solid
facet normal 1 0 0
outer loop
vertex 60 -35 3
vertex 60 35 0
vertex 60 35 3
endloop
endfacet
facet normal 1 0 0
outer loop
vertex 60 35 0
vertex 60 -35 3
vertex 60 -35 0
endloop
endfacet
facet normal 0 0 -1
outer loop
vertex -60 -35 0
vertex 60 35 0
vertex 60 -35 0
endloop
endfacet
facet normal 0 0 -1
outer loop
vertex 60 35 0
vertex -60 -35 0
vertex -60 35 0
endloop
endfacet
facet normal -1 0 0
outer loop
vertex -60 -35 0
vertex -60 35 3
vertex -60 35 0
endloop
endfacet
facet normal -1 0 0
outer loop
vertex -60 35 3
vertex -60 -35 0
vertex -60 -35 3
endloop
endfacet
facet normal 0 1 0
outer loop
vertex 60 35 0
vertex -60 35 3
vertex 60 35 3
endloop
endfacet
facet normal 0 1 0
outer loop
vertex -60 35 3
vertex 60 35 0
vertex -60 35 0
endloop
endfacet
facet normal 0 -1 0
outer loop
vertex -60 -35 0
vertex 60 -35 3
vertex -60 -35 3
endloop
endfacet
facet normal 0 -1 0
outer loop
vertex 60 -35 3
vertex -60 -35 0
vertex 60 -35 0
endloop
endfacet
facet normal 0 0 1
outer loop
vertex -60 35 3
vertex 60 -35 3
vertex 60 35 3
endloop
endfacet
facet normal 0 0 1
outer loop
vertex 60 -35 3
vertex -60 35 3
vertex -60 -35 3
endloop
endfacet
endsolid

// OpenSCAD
// Built by bench/smallmodels/features/compiler.py from a list of features.
$fn = 64;
difference() {
  union() {
    translate([0, 0, 0]) translate([-60, -35, 0]) cube([120, 70, 40]);
  }
  union() {
    translate([0, 0, 3]) rotate([0, 0, 0]) translate([-60, -35, 0]) cube([120, 70, 37]);
  }
}
